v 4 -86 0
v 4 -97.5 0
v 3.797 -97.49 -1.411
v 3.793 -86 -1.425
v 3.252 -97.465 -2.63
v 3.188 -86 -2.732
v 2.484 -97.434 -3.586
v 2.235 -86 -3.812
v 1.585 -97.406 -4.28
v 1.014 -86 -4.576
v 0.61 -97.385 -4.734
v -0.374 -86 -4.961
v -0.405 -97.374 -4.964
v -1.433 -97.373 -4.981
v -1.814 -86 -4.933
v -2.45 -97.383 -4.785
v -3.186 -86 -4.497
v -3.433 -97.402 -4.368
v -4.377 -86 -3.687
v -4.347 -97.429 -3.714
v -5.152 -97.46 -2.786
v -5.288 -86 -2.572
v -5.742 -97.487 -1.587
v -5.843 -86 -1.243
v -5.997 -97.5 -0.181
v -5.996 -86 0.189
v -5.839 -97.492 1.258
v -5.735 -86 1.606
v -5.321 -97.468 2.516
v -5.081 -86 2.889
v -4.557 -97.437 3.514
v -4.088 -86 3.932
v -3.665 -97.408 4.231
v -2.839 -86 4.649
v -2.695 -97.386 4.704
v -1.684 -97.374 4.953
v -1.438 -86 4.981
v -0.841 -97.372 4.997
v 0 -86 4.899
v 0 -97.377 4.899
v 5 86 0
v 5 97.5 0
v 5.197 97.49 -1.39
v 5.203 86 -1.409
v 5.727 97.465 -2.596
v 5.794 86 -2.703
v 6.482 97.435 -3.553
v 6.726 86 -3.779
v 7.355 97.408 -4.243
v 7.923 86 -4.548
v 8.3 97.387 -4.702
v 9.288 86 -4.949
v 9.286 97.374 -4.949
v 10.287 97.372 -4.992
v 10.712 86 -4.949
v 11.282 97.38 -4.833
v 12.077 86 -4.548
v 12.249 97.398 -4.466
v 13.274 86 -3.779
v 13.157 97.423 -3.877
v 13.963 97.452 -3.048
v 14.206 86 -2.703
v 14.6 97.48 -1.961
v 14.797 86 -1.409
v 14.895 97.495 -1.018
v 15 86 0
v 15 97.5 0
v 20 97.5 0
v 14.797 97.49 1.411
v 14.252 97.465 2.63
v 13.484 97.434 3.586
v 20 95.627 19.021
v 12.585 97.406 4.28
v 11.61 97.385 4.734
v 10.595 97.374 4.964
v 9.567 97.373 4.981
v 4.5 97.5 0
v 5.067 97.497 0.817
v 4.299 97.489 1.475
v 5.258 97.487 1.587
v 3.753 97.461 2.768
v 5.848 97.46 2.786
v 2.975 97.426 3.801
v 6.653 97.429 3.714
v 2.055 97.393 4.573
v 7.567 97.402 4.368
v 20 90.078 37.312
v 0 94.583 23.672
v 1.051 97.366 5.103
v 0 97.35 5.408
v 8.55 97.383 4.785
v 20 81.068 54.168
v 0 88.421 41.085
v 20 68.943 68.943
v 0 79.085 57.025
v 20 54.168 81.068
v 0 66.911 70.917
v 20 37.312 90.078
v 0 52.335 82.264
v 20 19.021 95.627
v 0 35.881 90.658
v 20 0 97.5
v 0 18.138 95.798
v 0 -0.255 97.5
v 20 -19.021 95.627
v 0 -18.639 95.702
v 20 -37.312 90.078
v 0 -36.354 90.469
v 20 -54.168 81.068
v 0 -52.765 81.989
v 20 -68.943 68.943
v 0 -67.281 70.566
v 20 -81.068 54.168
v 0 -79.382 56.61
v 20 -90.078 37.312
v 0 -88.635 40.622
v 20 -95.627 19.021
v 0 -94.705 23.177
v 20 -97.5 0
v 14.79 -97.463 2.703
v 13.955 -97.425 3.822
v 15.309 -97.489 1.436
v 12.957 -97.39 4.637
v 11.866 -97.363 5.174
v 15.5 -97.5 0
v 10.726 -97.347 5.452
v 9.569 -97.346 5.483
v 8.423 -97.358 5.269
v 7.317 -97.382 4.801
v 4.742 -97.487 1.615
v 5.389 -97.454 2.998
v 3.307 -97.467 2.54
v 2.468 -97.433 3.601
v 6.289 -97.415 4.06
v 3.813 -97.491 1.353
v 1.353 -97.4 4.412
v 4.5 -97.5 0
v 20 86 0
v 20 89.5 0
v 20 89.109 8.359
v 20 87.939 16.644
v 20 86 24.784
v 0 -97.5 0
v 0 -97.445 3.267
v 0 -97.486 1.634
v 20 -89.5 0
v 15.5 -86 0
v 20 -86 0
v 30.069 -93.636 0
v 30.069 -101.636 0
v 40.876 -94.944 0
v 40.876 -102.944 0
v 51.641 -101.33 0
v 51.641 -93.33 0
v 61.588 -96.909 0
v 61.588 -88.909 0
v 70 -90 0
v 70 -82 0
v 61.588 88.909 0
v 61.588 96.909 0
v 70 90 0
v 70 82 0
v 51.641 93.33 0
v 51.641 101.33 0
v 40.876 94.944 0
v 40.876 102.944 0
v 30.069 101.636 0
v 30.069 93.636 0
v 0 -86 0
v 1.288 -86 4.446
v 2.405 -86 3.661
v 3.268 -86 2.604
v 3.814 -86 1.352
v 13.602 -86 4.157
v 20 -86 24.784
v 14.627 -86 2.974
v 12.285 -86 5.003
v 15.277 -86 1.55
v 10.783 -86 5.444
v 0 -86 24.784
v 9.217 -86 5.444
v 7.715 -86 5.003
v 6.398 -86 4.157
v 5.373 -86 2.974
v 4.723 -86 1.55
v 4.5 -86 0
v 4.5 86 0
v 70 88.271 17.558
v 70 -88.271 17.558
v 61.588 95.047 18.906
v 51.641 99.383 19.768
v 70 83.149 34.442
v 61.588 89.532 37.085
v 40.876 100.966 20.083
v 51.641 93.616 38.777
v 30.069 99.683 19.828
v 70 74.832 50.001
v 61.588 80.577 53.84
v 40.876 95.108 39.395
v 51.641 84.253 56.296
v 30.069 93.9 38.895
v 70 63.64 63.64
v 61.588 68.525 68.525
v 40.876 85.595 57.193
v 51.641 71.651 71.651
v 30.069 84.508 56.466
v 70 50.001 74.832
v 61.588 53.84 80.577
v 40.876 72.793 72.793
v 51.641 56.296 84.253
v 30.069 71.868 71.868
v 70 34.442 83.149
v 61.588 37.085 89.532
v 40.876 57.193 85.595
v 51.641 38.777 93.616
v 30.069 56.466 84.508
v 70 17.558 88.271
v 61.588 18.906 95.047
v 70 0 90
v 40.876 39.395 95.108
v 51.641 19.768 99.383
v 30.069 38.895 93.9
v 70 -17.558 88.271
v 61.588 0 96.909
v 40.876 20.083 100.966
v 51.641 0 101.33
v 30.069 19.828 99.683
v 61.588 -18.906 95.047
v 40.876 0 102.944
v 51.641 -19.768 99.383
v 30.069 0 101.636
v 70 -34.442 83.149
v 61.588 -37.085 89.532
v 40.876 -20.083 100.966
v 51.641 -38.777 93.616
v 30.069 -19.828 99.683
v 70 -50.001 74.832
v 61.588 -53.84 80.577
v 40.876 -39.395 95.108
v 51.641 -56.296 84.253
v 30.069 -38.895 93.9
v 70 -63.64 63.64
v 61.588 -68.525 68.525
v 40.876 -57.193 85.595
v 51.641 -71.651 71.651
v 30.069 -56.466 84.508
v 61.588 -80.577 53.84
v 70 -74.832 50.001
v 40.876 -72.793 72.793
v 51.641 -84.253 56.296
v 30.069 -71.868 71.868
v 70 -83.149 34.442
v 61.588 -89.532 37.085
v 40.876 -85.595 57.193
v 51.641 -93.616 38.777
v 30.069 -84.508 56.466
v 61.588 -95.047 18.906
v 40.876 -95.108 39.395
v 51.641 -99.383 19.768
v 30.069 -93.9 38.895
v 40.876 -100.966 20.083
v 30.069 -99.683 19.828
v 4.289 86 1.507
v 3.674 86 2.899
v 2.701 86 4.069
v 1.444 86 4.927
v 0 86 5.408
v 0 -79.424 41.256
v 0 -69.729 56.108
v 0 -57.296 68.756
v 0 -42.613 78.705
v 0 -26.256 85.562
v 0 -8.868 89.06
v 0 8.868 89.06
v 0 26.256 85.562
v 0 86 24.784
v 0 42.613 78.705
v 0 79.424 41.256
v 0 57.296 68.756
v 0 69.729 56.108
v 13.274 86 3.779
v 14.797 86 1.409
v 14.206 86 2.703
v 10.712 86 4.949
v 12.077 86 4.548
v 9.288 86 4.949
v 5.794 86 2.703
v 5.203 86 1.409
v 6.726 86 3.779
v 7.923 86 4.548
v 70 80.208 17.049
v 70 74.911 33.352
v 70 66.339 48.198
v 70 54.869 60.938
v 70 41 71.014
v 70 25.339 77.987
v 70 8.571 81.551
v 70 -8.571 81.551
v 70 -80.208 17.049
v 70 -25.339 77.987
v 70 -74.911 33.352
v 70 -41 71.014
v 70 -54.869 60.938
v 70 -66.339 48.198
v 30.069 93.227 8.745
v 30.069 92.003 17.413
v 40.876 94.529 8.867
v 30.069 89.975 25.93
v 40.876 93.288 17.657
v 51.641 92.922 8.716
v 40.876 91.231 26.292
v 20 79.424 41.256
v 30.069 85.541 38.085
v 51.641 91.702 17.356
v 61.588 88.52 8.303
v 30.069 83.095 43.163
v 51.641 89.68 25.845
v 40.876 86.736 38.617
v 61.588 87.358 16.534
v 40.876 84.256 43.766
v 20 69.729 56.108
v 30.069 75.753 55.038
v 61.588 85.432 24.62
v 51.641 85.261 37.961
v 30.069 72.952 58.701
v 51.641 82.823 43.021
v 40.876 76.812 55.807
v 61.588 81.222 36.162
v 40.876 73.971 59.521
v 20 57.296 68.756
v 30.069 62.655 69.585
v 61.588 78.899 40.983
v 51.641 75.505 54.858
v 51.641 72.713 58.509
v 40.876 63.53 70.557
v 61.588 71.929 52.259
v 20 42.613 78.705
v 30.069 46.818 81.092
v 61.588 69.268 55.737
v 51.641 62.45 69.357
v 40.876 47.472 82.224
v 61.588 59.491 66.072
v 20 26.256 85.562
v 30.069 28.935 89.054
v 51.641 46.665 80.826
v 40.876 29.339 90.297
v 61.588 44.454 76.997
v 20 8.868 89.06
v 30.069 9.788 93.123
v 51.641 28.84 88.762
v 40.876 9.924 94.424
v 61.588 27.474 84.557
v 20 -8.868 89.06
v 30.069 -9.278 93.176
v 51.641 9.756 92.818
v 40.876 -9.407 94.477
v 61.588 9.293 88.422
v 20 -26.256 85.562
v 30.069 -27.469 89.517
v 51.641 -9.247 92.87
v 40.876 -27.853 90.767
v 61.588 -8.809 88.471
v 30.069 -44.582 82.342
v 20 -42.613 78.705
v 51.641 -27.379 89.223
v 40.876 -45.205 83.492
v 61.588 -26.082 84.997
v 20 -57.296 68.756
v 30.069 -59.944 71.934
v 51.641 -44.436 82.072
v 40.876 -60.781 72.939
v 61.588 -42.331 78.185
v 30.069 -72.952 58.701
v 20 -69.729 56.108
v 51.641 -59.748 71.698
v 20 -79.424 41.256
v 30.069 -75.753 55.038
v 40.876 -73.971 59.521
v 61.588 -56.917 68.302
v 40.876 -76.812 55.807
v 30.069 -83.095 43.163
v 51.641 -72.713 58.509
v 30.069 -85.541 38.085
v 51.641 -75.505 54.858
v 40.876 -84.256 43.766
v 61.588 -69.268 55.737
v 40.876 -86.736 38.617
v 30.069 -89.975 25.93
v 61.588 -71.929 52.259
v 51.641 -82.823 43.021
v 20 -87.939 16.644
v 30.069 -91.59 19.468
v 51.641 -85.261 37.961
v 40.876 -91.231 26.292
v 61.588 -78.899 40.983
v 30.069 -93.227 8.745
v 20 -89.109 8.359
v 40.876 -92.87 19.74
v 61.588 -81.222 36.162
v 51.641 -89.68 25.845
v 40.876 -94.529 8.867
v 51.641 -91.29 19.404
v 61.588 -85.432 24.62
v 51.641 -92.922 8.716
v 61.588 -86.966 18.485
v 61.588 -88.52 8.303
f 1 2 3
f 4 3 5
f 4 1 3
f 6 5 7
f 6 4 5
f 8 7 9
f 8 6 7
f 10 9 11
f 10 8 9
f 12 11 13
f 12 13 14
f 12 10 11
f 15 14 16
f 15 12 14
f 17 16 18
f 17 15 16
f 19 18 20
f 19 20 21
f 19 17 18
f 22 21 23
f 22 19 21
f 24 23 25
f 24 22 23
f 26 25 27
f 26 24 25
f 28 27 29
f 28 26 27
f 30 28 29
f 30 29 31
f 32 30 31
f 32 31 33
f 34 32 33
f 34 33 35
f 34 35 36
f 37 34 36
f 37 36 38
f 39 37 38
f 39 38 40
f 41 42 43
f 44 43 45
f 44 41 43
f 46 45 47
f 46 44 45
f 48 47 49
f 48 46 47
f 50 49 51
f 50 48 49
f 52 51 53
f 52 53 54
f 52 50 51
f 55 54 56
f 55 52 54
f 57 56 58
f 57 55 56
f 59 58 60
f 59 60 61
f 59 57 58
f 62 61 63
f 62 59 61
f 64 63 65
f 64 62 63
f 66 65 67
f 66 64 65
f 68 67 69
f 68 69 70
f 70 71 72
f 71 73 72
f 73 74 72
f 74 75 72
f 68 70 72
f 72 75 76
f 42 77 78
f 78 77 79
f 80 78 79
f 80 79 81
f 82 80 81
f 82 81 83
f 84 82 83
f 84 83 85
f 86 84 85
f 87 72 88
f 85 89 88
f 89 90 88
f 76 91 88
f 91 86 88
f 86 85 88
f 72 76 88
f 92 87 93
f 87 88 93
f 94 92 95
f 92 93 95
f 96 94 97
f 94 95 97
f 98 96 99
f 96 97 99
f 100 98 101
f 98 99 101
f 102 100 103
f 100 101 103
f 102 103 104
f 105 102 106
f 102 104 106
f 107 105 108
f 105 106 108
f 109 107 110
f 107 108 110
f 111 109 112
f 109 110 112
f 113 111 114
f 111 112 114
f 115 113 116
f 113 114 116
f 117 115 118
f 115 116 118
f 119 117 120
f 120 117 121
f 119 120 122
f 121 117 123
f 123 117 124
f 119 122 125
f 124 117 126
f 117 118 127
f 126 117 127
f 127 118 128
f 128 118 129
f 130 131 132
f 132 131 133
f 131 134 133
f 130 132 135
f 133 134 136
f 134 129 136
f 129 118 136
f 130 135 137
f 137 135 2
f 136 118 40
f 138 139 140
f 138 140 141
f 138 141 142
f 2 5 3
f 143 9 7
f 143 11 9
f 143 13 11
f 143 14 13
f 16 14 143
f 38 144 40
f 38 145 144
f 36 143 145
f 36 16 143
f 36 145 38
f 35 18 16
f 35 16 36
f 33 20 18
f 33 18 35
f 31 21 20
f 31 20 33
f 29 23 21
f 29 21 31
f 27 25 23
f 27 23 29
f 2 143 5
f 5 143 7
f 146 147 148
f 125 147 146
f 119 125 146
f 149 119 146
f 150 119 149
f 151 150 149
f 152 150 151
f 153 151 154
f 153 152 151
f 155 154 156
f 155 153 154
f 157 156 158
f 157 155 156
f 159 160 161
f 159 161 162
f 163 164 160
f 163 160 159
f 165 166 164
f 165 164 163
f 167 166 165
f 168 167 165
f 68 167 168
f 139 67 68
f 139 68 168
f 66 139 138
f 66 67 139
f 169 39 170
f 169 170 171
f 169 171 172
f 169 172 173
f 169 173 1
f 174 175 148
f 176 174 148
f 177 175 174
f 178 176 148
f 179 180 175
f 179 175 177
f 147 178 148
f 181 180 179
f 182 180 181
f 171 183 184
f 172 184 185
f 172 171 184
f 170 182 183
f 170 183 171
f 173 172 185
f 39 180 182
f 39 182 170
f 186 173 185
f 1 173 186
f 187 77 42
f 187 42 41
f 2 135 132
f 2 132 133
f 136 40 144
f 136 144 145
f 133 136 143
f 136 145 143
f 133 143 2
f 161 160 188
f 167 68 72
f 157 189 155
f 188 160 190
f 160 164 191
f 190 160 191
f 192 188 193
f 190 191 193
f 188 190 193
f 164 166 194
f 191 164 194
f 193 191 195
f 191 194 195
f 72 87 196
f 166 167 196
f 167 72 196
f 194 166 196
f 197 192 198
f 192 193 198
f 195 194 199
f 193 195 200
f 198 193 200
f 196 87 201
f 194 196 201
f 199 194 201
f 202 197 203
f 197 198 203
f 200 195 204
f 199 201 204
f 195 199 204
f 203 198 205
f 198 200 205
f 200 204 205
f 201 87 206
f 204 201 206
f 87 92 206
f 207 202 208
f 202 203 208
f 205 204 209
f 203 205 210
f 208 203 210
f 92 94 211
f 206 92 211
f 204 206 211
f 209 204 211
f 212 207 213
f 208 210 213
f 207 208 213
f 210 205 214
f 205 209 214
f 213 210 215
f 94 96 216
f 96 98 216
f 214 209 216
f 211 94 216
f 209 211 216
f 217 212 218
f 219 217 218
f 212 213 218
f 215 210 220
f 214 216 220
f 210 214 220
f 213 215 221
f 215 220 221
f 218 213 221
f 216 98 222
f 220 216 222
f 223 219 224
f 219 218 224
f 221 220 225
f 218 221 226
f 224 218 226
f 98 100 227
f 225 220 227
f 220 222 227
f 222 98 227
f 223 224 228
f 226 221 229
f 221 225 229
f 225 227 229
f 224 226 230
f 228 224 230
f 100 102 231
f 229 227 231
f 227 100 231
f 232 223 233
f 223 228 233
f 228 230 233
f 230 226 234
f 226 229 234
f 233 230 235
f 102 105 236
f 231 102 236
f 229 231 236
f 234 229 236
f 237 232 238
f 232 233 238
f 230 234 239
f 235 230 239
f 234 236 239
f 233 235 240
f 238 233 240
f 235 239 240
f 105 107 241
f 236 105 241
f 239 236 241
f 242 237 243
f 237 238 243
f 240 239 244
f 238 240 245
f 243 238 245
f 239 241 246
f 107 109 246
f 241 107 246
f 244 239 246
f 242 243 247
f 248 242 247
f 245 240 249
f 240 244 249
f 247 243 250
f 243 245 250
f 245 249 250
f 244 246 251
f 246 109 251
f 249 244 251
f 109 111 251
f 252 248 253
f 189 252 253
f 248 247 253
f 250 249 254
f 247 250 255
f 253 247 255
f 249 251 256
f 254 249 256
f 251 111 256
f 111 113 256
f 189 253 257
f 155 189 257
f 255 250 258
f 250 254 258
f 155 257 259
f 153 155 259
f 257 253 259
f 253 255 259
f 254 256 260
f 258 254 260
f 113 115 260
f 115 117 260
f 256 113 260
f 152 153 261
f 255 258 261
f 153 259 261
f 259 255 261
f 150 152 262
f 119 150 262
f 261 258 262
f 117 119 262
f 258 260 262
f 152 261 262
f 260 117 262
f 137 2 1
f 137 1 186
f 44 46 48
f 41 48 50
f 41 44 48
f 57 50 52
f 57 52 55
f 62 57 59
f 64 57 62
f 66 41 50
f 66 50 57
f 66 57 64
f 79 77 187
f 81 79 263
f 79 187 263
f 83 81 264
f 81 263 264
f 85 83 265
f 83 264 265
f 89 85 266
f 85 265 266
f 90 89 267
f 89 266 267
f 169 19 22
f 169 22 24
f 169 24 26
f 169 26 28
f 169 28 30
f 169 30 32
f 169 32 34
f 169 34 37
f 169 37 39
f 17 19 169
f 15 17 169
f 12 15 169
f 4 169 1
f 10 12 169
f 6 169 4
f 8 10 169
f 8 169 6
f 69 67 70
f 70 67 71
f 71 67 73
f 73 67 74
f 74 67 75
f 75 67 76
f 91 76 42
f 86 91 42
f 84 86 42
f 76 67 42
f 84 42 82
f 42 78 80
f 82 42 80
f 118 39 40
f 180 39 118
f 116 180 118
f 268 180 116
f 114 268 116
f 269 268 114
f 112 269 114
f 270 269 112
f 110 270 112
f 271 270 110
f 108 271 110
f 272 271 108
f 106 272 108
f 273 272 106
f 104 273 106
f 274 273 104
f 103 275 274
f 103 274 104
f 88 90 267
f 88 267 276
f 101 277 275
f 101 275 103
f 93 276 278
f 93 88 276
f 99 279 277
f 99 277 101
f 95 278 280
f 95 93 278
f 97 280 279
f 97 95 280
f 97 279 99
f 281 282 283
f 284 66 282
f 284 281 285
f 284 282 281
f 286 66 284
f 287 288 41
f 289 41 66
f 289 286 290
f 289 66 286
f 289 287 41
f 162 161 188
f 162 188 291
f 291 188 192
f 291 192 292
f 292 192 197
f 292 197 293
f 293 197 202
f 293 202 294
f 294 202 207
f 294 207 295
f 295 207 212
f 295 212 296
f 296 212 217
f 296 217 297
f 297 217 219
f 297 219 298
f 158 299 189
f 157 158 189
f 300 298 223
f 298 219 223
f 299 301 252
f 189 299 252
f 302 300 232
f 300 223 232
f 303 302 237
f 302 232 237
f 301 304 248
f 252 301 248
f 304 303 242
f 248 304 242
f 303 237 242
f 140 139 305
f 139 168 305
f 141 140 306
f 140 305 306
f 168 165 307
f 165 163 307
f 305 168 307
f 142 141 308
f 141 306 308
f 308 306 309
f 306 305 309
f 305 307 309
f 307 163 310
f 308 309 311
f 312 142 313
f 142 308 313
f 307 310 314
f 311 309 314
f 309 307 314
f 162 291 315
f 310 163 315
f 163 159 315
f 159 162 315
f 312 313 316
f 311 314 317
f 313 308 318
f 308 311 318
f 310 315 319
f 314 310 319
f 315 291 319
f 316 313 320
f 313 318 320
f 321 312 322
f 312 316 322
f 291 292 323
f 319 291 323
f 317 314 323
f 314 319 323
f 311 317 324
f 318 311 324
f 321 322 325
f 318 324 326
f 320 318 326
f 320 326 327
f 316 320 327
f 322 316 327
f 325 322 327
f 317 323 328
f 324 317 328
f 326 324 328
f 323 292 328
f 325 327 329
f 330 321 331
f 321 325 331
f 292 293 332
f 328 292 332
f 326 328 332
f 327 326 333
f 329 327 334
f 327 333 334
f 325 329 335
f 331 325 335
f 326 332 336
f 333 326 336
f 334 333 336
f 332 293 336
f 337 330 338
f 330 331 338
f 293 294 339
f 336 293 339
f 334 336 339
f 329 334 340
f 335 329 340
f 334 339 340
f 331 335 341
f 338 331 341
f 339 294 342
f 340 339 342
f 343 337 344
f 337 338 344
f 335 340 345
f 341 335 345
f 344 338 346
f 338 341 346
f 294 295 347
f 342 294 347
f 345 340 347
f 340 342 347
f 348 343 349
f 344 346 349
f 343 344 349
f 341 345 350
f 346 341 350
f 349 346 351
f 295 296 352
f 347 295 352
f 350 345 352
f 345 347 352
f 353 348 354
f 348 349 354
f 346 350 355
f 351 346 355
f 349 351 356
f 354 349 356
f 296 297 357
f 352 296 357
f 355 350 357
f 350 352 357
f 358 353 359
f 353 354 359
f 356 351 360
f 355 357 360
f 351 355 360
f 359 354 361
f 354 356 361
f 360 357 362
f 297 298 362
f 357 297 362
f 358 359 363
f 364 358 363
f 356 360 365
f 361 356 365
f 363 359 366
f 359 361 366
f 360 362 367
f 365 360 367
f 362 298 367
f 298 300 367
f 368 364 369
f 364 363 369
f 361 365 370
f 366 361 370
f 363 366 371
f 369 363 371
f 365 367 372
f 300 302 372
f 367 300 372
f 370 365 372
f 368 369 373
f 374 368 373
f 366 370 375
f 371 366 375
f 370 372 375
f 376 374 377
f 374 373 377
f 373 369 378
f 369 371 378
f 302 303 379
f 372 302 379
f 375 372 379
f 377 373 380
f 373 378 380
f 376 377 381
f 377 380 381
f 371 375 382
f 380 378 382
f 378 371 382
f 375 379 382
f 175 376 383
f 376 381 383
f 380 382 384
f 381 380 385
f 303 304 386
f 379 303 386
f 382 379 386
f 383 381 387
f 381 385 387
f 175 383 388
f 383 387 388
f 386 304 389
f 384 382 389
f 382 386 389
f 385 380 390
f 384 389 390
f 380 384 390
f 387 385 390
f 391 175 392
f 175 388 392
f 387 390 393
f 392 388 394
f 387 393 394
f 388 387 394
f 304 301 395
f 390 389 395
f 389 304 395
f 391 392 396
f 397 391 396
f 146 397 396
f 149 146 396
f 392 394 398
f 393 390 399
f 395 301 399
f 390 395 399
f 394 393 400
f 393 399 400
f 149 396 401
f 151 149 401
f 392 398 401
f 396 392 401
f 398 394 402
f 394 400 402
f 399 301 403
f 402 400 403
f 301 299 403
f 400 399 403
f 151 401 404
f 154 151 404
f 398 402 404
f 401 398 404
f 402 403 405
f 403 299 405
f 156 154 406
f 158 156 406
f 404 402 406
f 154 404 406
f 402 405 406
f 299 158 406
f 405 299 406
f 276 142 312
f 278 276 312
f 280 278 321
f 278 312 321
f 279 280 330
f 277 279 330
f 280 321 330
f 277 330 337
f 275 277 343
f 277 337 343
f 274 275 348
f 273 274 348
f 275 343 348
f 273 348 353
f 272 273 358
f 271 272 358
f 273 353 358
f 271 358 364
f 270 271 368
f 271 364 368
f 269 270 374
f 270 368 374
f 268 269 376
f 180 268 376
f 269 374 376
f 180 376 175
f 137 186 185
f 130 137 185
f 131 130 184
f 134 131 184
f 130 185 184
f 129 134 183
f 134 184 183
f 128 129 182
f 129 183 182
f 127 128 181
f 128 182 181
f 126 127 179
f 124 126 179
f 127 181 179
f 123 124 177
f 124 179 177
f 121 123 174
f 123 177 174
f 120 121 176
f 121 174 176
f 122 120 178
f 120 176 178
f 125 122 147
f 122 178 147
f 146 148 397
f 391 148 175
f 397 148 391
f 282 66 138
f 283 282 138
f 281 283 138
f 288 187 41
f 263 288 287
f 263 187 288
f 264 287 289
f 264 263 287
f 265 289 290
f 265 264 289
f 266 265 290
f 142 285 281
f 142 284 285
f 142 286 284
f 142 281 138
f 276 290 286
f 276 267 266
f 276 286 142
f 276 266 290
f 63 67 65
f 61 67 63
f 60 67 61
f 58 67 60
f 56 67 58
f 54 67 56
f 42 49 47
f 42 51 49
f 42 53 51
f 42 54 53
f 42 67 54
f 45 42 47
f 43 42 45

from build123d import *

# Parameters (mm, degrees)
REVOLVE1_ANGLE           = 180
BOSS_EXTRUDE1_DEPTH      = 20
BOSS_EXTRUDE2_REACH      = 228.274
BOSS_EXTRUDE2_END_RADIUS = 97.5
SKETCH5_R                = 5
CUT_EXTRUDE1_REACH       = 228.274
CUT_EXTRUDE1_END_RADIUS  = 97.5
SKETCH6_R                = 5.5
BOSS_EXTRUDE3_REACH      = 228.274
BOSS_EXTRUDE3_END_RADIUS = 97.5
SKETCH8_R                = 5
CUT_EXTRUDE2_REACH       = 228.274
CUT_EXTRUDE2_END_RADIUS  = 97.5
SKETCH10_R               = 5.5


with BuildPart() as part:
    # Sketch1 → Revolve1 (revolve)
    with BuildSketch(Plane.XY):
        with BuildLine():
            Line((0, 89.5), (20, 89.5))
            ThreePointArc((20, 89.5), (46.3125, 94.5), (70, 82))
            Line((70, 82), (70, 90))
            ThreePointArc((70, 90), (46.3125, 102.5), (20, 97.5))
            Line((20, 97.5), (0, 97.5))
            Line((0, 97.5), (0, 89.5))
        make_face()
    revolve(axis=Axis((0, 0, 0), (1, 0, 0)), revolution_arc=REVOLVE1_ANGLE)

    # Sketch3 → Boss-Extrude1 (add)
    with BuildSketch(Plane.ZY):
        with BuildLine():
            ThreePointArc((24.784067463, 86), (12.514991011, 88.620680431), (0, 89.5))
            Line((0, 89.5), (0, 86))
            Line((0, 86), (24.784067463, 86))
        make_face()
        with BuildLine():
            Line((0, -86), (0, -89.5))
            ThreePointArc((0, -89.5), (12.514991011, -88.620680431), (24.784067463, -86))
            Line((24.784067463, -86), (0, -86))
        make_face()
    extrude(amount=-BOSS_EXTRUDE1_DEPTH)

    # Boss-Extrude2: up to this cylinder (the profile starts inside it)
    boss_extrude2_end = Plane(origin=(10, 0, 0), z_dir=(-1, 0, 0)) * Cylinder(BOSS_EXTRUDE2_END_RADIUS, 652.548, mode=Mode.PRIVATE)
    # Sketch5 → Boss-Extrude2 (add, up to the surface)
    with BuildSketch(Plane.XZ.offset(-86), mode=Mode.PRIVATE) as boss_extrude2_sk1:
        with Locations((10, 0)):
            Circle(SKETCH5_R)
    boss_extrude2_tool1 = extrude(boss_extrude2_sk1.sketch, amount=-BOSS_EXTRUDE2_REACH, mode=Mode.PRIVATE) & boss_extrude2_end
    add(boss_extrude2_tool1.solids().sort_by_distance((10, 86, 0))[0])

    # Cut-Extrude1: up to this cylinder (the profile starts inside it)
    cut_extrude1_end = Plane(origin=(10, 0, 0), z_dir=(-1, 0, 0)) * Cylinder(CUT_EXTRUDE1_END_RADIUS, 652.548, mode=Mode.PRIVATE)
    # Sketch6 → Cut-Extrude1 (cut, up to the surface)
    with BuildSketch(Plane(origin=(0, -86, 0), x_dir=(1, 0, 0), z_dir=(0, 1, 0)), mode=Mode.PRIVATE) as cut_extrude1_sk1:
        with Locations((10, 0)):
            Circle(SKETCH6_R)
    cut_extrude1_tool1 = extrude(cut_extrude1_sk1.sketch, amount=-CUT_EXTRUDE1_REACH, mode=Mode.PRIVATE) & cut_extrude1_end
    add(cut_extrude1_tool1.solids().sort_by_distance((10, -86, 0))[0], mode=Mode.SUBTRACT)

    # Boss-Extrude3: up to this cylinder (the profile starts inside it)
    boss_extrude3_end = Plane(origin=(-1, 0, 0), z_dir=(-1, 0, 0)) * Cylinder(BOSS_EXTRUDE3_END_RADIUS, 652.548, mode=Mode.PRIVATE)
    # Sketch8 → Boss-Extrude3 (add, up to the surface)
    with BuildSketch(Plane(origin=(0, -86, 0), x_dir=(1, 0, 0), z_dir=(0, 1, 0)), mode=Mode.PRIVATE) as boss_extrude3_sk1:
        with Locations((-1, 0)):
            Circle(SKETCH8_R)
    boss_extrude3_tool1 = extrude(boss_extrude3_sk1.sketch, amount=-BOSS_EXTRUDE3_REACH, mode=Mode.PRIVATE) & boss_extrude3_end
    add(boss_extrude3_tool1.solids().sort_by_distance((-1, -86, 0))[0])

    # Cut-Extrude2: up to this cylinder (the profile starts inside it)
    cut_extrude2_end = Plane(origin=(-1, 0, 0), z_dir=(-1, 0, 0)) * Cylinder(CUT_EXTRUDE2_END_RADIUS, 652.548, mode=Mode.PRIVATE)
    # Sketch10 → Cut-Extrude2 (cut, up to the surface)
    with BuildSketch(Plane.XZ.offset(-86), mode=Mode.PRIVATE) as cut_extrude2_sk1:
        with Locations((-1, 0)):
            Circle(SKETCH10_R)
    cut_extrude2_tool1 = extrude(cut_extrude2_sk1.sketch, amount=-CUT_EXTRUDE2_REACH, mode=Mode.PRIVATE) & cut_extrude2_end
    add(cut_extrude2_tool1.solids().sort_by_distance((-1, 86, 0))[0], mode=Mode.SUBTRACT)


solid = part.part
